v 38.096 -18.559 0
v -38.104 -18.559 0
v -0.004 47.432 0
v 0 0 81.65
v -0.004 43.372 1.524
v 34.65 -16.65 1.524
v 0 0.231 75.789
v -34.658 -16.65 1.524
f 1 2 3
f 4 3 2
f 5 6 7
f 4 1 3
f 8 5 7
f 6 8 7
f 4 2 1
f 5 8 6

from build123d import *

# Parameters (mm, degrees)
F3_T = -1.524


with BuildPart() as f2:
    # F0 (on Top) → F2 section 0
    with BuildSketch(Plane.XY, mode=Mode.PRIVATE) as f2_s0:
        Polygon((-38.1041381436, -18.5593732185), (38.0958618564, -18.5593732185), (-0.0041380687, 47.4317625066), align=None)
    loft([f2_s0.sketch, Vertex(0, 0, 81.65)])

    # F3 (hollow: no face is removed)
    offset(amount=F3_T, mode=Mode.SUBTRACT)


solid = f2.part
